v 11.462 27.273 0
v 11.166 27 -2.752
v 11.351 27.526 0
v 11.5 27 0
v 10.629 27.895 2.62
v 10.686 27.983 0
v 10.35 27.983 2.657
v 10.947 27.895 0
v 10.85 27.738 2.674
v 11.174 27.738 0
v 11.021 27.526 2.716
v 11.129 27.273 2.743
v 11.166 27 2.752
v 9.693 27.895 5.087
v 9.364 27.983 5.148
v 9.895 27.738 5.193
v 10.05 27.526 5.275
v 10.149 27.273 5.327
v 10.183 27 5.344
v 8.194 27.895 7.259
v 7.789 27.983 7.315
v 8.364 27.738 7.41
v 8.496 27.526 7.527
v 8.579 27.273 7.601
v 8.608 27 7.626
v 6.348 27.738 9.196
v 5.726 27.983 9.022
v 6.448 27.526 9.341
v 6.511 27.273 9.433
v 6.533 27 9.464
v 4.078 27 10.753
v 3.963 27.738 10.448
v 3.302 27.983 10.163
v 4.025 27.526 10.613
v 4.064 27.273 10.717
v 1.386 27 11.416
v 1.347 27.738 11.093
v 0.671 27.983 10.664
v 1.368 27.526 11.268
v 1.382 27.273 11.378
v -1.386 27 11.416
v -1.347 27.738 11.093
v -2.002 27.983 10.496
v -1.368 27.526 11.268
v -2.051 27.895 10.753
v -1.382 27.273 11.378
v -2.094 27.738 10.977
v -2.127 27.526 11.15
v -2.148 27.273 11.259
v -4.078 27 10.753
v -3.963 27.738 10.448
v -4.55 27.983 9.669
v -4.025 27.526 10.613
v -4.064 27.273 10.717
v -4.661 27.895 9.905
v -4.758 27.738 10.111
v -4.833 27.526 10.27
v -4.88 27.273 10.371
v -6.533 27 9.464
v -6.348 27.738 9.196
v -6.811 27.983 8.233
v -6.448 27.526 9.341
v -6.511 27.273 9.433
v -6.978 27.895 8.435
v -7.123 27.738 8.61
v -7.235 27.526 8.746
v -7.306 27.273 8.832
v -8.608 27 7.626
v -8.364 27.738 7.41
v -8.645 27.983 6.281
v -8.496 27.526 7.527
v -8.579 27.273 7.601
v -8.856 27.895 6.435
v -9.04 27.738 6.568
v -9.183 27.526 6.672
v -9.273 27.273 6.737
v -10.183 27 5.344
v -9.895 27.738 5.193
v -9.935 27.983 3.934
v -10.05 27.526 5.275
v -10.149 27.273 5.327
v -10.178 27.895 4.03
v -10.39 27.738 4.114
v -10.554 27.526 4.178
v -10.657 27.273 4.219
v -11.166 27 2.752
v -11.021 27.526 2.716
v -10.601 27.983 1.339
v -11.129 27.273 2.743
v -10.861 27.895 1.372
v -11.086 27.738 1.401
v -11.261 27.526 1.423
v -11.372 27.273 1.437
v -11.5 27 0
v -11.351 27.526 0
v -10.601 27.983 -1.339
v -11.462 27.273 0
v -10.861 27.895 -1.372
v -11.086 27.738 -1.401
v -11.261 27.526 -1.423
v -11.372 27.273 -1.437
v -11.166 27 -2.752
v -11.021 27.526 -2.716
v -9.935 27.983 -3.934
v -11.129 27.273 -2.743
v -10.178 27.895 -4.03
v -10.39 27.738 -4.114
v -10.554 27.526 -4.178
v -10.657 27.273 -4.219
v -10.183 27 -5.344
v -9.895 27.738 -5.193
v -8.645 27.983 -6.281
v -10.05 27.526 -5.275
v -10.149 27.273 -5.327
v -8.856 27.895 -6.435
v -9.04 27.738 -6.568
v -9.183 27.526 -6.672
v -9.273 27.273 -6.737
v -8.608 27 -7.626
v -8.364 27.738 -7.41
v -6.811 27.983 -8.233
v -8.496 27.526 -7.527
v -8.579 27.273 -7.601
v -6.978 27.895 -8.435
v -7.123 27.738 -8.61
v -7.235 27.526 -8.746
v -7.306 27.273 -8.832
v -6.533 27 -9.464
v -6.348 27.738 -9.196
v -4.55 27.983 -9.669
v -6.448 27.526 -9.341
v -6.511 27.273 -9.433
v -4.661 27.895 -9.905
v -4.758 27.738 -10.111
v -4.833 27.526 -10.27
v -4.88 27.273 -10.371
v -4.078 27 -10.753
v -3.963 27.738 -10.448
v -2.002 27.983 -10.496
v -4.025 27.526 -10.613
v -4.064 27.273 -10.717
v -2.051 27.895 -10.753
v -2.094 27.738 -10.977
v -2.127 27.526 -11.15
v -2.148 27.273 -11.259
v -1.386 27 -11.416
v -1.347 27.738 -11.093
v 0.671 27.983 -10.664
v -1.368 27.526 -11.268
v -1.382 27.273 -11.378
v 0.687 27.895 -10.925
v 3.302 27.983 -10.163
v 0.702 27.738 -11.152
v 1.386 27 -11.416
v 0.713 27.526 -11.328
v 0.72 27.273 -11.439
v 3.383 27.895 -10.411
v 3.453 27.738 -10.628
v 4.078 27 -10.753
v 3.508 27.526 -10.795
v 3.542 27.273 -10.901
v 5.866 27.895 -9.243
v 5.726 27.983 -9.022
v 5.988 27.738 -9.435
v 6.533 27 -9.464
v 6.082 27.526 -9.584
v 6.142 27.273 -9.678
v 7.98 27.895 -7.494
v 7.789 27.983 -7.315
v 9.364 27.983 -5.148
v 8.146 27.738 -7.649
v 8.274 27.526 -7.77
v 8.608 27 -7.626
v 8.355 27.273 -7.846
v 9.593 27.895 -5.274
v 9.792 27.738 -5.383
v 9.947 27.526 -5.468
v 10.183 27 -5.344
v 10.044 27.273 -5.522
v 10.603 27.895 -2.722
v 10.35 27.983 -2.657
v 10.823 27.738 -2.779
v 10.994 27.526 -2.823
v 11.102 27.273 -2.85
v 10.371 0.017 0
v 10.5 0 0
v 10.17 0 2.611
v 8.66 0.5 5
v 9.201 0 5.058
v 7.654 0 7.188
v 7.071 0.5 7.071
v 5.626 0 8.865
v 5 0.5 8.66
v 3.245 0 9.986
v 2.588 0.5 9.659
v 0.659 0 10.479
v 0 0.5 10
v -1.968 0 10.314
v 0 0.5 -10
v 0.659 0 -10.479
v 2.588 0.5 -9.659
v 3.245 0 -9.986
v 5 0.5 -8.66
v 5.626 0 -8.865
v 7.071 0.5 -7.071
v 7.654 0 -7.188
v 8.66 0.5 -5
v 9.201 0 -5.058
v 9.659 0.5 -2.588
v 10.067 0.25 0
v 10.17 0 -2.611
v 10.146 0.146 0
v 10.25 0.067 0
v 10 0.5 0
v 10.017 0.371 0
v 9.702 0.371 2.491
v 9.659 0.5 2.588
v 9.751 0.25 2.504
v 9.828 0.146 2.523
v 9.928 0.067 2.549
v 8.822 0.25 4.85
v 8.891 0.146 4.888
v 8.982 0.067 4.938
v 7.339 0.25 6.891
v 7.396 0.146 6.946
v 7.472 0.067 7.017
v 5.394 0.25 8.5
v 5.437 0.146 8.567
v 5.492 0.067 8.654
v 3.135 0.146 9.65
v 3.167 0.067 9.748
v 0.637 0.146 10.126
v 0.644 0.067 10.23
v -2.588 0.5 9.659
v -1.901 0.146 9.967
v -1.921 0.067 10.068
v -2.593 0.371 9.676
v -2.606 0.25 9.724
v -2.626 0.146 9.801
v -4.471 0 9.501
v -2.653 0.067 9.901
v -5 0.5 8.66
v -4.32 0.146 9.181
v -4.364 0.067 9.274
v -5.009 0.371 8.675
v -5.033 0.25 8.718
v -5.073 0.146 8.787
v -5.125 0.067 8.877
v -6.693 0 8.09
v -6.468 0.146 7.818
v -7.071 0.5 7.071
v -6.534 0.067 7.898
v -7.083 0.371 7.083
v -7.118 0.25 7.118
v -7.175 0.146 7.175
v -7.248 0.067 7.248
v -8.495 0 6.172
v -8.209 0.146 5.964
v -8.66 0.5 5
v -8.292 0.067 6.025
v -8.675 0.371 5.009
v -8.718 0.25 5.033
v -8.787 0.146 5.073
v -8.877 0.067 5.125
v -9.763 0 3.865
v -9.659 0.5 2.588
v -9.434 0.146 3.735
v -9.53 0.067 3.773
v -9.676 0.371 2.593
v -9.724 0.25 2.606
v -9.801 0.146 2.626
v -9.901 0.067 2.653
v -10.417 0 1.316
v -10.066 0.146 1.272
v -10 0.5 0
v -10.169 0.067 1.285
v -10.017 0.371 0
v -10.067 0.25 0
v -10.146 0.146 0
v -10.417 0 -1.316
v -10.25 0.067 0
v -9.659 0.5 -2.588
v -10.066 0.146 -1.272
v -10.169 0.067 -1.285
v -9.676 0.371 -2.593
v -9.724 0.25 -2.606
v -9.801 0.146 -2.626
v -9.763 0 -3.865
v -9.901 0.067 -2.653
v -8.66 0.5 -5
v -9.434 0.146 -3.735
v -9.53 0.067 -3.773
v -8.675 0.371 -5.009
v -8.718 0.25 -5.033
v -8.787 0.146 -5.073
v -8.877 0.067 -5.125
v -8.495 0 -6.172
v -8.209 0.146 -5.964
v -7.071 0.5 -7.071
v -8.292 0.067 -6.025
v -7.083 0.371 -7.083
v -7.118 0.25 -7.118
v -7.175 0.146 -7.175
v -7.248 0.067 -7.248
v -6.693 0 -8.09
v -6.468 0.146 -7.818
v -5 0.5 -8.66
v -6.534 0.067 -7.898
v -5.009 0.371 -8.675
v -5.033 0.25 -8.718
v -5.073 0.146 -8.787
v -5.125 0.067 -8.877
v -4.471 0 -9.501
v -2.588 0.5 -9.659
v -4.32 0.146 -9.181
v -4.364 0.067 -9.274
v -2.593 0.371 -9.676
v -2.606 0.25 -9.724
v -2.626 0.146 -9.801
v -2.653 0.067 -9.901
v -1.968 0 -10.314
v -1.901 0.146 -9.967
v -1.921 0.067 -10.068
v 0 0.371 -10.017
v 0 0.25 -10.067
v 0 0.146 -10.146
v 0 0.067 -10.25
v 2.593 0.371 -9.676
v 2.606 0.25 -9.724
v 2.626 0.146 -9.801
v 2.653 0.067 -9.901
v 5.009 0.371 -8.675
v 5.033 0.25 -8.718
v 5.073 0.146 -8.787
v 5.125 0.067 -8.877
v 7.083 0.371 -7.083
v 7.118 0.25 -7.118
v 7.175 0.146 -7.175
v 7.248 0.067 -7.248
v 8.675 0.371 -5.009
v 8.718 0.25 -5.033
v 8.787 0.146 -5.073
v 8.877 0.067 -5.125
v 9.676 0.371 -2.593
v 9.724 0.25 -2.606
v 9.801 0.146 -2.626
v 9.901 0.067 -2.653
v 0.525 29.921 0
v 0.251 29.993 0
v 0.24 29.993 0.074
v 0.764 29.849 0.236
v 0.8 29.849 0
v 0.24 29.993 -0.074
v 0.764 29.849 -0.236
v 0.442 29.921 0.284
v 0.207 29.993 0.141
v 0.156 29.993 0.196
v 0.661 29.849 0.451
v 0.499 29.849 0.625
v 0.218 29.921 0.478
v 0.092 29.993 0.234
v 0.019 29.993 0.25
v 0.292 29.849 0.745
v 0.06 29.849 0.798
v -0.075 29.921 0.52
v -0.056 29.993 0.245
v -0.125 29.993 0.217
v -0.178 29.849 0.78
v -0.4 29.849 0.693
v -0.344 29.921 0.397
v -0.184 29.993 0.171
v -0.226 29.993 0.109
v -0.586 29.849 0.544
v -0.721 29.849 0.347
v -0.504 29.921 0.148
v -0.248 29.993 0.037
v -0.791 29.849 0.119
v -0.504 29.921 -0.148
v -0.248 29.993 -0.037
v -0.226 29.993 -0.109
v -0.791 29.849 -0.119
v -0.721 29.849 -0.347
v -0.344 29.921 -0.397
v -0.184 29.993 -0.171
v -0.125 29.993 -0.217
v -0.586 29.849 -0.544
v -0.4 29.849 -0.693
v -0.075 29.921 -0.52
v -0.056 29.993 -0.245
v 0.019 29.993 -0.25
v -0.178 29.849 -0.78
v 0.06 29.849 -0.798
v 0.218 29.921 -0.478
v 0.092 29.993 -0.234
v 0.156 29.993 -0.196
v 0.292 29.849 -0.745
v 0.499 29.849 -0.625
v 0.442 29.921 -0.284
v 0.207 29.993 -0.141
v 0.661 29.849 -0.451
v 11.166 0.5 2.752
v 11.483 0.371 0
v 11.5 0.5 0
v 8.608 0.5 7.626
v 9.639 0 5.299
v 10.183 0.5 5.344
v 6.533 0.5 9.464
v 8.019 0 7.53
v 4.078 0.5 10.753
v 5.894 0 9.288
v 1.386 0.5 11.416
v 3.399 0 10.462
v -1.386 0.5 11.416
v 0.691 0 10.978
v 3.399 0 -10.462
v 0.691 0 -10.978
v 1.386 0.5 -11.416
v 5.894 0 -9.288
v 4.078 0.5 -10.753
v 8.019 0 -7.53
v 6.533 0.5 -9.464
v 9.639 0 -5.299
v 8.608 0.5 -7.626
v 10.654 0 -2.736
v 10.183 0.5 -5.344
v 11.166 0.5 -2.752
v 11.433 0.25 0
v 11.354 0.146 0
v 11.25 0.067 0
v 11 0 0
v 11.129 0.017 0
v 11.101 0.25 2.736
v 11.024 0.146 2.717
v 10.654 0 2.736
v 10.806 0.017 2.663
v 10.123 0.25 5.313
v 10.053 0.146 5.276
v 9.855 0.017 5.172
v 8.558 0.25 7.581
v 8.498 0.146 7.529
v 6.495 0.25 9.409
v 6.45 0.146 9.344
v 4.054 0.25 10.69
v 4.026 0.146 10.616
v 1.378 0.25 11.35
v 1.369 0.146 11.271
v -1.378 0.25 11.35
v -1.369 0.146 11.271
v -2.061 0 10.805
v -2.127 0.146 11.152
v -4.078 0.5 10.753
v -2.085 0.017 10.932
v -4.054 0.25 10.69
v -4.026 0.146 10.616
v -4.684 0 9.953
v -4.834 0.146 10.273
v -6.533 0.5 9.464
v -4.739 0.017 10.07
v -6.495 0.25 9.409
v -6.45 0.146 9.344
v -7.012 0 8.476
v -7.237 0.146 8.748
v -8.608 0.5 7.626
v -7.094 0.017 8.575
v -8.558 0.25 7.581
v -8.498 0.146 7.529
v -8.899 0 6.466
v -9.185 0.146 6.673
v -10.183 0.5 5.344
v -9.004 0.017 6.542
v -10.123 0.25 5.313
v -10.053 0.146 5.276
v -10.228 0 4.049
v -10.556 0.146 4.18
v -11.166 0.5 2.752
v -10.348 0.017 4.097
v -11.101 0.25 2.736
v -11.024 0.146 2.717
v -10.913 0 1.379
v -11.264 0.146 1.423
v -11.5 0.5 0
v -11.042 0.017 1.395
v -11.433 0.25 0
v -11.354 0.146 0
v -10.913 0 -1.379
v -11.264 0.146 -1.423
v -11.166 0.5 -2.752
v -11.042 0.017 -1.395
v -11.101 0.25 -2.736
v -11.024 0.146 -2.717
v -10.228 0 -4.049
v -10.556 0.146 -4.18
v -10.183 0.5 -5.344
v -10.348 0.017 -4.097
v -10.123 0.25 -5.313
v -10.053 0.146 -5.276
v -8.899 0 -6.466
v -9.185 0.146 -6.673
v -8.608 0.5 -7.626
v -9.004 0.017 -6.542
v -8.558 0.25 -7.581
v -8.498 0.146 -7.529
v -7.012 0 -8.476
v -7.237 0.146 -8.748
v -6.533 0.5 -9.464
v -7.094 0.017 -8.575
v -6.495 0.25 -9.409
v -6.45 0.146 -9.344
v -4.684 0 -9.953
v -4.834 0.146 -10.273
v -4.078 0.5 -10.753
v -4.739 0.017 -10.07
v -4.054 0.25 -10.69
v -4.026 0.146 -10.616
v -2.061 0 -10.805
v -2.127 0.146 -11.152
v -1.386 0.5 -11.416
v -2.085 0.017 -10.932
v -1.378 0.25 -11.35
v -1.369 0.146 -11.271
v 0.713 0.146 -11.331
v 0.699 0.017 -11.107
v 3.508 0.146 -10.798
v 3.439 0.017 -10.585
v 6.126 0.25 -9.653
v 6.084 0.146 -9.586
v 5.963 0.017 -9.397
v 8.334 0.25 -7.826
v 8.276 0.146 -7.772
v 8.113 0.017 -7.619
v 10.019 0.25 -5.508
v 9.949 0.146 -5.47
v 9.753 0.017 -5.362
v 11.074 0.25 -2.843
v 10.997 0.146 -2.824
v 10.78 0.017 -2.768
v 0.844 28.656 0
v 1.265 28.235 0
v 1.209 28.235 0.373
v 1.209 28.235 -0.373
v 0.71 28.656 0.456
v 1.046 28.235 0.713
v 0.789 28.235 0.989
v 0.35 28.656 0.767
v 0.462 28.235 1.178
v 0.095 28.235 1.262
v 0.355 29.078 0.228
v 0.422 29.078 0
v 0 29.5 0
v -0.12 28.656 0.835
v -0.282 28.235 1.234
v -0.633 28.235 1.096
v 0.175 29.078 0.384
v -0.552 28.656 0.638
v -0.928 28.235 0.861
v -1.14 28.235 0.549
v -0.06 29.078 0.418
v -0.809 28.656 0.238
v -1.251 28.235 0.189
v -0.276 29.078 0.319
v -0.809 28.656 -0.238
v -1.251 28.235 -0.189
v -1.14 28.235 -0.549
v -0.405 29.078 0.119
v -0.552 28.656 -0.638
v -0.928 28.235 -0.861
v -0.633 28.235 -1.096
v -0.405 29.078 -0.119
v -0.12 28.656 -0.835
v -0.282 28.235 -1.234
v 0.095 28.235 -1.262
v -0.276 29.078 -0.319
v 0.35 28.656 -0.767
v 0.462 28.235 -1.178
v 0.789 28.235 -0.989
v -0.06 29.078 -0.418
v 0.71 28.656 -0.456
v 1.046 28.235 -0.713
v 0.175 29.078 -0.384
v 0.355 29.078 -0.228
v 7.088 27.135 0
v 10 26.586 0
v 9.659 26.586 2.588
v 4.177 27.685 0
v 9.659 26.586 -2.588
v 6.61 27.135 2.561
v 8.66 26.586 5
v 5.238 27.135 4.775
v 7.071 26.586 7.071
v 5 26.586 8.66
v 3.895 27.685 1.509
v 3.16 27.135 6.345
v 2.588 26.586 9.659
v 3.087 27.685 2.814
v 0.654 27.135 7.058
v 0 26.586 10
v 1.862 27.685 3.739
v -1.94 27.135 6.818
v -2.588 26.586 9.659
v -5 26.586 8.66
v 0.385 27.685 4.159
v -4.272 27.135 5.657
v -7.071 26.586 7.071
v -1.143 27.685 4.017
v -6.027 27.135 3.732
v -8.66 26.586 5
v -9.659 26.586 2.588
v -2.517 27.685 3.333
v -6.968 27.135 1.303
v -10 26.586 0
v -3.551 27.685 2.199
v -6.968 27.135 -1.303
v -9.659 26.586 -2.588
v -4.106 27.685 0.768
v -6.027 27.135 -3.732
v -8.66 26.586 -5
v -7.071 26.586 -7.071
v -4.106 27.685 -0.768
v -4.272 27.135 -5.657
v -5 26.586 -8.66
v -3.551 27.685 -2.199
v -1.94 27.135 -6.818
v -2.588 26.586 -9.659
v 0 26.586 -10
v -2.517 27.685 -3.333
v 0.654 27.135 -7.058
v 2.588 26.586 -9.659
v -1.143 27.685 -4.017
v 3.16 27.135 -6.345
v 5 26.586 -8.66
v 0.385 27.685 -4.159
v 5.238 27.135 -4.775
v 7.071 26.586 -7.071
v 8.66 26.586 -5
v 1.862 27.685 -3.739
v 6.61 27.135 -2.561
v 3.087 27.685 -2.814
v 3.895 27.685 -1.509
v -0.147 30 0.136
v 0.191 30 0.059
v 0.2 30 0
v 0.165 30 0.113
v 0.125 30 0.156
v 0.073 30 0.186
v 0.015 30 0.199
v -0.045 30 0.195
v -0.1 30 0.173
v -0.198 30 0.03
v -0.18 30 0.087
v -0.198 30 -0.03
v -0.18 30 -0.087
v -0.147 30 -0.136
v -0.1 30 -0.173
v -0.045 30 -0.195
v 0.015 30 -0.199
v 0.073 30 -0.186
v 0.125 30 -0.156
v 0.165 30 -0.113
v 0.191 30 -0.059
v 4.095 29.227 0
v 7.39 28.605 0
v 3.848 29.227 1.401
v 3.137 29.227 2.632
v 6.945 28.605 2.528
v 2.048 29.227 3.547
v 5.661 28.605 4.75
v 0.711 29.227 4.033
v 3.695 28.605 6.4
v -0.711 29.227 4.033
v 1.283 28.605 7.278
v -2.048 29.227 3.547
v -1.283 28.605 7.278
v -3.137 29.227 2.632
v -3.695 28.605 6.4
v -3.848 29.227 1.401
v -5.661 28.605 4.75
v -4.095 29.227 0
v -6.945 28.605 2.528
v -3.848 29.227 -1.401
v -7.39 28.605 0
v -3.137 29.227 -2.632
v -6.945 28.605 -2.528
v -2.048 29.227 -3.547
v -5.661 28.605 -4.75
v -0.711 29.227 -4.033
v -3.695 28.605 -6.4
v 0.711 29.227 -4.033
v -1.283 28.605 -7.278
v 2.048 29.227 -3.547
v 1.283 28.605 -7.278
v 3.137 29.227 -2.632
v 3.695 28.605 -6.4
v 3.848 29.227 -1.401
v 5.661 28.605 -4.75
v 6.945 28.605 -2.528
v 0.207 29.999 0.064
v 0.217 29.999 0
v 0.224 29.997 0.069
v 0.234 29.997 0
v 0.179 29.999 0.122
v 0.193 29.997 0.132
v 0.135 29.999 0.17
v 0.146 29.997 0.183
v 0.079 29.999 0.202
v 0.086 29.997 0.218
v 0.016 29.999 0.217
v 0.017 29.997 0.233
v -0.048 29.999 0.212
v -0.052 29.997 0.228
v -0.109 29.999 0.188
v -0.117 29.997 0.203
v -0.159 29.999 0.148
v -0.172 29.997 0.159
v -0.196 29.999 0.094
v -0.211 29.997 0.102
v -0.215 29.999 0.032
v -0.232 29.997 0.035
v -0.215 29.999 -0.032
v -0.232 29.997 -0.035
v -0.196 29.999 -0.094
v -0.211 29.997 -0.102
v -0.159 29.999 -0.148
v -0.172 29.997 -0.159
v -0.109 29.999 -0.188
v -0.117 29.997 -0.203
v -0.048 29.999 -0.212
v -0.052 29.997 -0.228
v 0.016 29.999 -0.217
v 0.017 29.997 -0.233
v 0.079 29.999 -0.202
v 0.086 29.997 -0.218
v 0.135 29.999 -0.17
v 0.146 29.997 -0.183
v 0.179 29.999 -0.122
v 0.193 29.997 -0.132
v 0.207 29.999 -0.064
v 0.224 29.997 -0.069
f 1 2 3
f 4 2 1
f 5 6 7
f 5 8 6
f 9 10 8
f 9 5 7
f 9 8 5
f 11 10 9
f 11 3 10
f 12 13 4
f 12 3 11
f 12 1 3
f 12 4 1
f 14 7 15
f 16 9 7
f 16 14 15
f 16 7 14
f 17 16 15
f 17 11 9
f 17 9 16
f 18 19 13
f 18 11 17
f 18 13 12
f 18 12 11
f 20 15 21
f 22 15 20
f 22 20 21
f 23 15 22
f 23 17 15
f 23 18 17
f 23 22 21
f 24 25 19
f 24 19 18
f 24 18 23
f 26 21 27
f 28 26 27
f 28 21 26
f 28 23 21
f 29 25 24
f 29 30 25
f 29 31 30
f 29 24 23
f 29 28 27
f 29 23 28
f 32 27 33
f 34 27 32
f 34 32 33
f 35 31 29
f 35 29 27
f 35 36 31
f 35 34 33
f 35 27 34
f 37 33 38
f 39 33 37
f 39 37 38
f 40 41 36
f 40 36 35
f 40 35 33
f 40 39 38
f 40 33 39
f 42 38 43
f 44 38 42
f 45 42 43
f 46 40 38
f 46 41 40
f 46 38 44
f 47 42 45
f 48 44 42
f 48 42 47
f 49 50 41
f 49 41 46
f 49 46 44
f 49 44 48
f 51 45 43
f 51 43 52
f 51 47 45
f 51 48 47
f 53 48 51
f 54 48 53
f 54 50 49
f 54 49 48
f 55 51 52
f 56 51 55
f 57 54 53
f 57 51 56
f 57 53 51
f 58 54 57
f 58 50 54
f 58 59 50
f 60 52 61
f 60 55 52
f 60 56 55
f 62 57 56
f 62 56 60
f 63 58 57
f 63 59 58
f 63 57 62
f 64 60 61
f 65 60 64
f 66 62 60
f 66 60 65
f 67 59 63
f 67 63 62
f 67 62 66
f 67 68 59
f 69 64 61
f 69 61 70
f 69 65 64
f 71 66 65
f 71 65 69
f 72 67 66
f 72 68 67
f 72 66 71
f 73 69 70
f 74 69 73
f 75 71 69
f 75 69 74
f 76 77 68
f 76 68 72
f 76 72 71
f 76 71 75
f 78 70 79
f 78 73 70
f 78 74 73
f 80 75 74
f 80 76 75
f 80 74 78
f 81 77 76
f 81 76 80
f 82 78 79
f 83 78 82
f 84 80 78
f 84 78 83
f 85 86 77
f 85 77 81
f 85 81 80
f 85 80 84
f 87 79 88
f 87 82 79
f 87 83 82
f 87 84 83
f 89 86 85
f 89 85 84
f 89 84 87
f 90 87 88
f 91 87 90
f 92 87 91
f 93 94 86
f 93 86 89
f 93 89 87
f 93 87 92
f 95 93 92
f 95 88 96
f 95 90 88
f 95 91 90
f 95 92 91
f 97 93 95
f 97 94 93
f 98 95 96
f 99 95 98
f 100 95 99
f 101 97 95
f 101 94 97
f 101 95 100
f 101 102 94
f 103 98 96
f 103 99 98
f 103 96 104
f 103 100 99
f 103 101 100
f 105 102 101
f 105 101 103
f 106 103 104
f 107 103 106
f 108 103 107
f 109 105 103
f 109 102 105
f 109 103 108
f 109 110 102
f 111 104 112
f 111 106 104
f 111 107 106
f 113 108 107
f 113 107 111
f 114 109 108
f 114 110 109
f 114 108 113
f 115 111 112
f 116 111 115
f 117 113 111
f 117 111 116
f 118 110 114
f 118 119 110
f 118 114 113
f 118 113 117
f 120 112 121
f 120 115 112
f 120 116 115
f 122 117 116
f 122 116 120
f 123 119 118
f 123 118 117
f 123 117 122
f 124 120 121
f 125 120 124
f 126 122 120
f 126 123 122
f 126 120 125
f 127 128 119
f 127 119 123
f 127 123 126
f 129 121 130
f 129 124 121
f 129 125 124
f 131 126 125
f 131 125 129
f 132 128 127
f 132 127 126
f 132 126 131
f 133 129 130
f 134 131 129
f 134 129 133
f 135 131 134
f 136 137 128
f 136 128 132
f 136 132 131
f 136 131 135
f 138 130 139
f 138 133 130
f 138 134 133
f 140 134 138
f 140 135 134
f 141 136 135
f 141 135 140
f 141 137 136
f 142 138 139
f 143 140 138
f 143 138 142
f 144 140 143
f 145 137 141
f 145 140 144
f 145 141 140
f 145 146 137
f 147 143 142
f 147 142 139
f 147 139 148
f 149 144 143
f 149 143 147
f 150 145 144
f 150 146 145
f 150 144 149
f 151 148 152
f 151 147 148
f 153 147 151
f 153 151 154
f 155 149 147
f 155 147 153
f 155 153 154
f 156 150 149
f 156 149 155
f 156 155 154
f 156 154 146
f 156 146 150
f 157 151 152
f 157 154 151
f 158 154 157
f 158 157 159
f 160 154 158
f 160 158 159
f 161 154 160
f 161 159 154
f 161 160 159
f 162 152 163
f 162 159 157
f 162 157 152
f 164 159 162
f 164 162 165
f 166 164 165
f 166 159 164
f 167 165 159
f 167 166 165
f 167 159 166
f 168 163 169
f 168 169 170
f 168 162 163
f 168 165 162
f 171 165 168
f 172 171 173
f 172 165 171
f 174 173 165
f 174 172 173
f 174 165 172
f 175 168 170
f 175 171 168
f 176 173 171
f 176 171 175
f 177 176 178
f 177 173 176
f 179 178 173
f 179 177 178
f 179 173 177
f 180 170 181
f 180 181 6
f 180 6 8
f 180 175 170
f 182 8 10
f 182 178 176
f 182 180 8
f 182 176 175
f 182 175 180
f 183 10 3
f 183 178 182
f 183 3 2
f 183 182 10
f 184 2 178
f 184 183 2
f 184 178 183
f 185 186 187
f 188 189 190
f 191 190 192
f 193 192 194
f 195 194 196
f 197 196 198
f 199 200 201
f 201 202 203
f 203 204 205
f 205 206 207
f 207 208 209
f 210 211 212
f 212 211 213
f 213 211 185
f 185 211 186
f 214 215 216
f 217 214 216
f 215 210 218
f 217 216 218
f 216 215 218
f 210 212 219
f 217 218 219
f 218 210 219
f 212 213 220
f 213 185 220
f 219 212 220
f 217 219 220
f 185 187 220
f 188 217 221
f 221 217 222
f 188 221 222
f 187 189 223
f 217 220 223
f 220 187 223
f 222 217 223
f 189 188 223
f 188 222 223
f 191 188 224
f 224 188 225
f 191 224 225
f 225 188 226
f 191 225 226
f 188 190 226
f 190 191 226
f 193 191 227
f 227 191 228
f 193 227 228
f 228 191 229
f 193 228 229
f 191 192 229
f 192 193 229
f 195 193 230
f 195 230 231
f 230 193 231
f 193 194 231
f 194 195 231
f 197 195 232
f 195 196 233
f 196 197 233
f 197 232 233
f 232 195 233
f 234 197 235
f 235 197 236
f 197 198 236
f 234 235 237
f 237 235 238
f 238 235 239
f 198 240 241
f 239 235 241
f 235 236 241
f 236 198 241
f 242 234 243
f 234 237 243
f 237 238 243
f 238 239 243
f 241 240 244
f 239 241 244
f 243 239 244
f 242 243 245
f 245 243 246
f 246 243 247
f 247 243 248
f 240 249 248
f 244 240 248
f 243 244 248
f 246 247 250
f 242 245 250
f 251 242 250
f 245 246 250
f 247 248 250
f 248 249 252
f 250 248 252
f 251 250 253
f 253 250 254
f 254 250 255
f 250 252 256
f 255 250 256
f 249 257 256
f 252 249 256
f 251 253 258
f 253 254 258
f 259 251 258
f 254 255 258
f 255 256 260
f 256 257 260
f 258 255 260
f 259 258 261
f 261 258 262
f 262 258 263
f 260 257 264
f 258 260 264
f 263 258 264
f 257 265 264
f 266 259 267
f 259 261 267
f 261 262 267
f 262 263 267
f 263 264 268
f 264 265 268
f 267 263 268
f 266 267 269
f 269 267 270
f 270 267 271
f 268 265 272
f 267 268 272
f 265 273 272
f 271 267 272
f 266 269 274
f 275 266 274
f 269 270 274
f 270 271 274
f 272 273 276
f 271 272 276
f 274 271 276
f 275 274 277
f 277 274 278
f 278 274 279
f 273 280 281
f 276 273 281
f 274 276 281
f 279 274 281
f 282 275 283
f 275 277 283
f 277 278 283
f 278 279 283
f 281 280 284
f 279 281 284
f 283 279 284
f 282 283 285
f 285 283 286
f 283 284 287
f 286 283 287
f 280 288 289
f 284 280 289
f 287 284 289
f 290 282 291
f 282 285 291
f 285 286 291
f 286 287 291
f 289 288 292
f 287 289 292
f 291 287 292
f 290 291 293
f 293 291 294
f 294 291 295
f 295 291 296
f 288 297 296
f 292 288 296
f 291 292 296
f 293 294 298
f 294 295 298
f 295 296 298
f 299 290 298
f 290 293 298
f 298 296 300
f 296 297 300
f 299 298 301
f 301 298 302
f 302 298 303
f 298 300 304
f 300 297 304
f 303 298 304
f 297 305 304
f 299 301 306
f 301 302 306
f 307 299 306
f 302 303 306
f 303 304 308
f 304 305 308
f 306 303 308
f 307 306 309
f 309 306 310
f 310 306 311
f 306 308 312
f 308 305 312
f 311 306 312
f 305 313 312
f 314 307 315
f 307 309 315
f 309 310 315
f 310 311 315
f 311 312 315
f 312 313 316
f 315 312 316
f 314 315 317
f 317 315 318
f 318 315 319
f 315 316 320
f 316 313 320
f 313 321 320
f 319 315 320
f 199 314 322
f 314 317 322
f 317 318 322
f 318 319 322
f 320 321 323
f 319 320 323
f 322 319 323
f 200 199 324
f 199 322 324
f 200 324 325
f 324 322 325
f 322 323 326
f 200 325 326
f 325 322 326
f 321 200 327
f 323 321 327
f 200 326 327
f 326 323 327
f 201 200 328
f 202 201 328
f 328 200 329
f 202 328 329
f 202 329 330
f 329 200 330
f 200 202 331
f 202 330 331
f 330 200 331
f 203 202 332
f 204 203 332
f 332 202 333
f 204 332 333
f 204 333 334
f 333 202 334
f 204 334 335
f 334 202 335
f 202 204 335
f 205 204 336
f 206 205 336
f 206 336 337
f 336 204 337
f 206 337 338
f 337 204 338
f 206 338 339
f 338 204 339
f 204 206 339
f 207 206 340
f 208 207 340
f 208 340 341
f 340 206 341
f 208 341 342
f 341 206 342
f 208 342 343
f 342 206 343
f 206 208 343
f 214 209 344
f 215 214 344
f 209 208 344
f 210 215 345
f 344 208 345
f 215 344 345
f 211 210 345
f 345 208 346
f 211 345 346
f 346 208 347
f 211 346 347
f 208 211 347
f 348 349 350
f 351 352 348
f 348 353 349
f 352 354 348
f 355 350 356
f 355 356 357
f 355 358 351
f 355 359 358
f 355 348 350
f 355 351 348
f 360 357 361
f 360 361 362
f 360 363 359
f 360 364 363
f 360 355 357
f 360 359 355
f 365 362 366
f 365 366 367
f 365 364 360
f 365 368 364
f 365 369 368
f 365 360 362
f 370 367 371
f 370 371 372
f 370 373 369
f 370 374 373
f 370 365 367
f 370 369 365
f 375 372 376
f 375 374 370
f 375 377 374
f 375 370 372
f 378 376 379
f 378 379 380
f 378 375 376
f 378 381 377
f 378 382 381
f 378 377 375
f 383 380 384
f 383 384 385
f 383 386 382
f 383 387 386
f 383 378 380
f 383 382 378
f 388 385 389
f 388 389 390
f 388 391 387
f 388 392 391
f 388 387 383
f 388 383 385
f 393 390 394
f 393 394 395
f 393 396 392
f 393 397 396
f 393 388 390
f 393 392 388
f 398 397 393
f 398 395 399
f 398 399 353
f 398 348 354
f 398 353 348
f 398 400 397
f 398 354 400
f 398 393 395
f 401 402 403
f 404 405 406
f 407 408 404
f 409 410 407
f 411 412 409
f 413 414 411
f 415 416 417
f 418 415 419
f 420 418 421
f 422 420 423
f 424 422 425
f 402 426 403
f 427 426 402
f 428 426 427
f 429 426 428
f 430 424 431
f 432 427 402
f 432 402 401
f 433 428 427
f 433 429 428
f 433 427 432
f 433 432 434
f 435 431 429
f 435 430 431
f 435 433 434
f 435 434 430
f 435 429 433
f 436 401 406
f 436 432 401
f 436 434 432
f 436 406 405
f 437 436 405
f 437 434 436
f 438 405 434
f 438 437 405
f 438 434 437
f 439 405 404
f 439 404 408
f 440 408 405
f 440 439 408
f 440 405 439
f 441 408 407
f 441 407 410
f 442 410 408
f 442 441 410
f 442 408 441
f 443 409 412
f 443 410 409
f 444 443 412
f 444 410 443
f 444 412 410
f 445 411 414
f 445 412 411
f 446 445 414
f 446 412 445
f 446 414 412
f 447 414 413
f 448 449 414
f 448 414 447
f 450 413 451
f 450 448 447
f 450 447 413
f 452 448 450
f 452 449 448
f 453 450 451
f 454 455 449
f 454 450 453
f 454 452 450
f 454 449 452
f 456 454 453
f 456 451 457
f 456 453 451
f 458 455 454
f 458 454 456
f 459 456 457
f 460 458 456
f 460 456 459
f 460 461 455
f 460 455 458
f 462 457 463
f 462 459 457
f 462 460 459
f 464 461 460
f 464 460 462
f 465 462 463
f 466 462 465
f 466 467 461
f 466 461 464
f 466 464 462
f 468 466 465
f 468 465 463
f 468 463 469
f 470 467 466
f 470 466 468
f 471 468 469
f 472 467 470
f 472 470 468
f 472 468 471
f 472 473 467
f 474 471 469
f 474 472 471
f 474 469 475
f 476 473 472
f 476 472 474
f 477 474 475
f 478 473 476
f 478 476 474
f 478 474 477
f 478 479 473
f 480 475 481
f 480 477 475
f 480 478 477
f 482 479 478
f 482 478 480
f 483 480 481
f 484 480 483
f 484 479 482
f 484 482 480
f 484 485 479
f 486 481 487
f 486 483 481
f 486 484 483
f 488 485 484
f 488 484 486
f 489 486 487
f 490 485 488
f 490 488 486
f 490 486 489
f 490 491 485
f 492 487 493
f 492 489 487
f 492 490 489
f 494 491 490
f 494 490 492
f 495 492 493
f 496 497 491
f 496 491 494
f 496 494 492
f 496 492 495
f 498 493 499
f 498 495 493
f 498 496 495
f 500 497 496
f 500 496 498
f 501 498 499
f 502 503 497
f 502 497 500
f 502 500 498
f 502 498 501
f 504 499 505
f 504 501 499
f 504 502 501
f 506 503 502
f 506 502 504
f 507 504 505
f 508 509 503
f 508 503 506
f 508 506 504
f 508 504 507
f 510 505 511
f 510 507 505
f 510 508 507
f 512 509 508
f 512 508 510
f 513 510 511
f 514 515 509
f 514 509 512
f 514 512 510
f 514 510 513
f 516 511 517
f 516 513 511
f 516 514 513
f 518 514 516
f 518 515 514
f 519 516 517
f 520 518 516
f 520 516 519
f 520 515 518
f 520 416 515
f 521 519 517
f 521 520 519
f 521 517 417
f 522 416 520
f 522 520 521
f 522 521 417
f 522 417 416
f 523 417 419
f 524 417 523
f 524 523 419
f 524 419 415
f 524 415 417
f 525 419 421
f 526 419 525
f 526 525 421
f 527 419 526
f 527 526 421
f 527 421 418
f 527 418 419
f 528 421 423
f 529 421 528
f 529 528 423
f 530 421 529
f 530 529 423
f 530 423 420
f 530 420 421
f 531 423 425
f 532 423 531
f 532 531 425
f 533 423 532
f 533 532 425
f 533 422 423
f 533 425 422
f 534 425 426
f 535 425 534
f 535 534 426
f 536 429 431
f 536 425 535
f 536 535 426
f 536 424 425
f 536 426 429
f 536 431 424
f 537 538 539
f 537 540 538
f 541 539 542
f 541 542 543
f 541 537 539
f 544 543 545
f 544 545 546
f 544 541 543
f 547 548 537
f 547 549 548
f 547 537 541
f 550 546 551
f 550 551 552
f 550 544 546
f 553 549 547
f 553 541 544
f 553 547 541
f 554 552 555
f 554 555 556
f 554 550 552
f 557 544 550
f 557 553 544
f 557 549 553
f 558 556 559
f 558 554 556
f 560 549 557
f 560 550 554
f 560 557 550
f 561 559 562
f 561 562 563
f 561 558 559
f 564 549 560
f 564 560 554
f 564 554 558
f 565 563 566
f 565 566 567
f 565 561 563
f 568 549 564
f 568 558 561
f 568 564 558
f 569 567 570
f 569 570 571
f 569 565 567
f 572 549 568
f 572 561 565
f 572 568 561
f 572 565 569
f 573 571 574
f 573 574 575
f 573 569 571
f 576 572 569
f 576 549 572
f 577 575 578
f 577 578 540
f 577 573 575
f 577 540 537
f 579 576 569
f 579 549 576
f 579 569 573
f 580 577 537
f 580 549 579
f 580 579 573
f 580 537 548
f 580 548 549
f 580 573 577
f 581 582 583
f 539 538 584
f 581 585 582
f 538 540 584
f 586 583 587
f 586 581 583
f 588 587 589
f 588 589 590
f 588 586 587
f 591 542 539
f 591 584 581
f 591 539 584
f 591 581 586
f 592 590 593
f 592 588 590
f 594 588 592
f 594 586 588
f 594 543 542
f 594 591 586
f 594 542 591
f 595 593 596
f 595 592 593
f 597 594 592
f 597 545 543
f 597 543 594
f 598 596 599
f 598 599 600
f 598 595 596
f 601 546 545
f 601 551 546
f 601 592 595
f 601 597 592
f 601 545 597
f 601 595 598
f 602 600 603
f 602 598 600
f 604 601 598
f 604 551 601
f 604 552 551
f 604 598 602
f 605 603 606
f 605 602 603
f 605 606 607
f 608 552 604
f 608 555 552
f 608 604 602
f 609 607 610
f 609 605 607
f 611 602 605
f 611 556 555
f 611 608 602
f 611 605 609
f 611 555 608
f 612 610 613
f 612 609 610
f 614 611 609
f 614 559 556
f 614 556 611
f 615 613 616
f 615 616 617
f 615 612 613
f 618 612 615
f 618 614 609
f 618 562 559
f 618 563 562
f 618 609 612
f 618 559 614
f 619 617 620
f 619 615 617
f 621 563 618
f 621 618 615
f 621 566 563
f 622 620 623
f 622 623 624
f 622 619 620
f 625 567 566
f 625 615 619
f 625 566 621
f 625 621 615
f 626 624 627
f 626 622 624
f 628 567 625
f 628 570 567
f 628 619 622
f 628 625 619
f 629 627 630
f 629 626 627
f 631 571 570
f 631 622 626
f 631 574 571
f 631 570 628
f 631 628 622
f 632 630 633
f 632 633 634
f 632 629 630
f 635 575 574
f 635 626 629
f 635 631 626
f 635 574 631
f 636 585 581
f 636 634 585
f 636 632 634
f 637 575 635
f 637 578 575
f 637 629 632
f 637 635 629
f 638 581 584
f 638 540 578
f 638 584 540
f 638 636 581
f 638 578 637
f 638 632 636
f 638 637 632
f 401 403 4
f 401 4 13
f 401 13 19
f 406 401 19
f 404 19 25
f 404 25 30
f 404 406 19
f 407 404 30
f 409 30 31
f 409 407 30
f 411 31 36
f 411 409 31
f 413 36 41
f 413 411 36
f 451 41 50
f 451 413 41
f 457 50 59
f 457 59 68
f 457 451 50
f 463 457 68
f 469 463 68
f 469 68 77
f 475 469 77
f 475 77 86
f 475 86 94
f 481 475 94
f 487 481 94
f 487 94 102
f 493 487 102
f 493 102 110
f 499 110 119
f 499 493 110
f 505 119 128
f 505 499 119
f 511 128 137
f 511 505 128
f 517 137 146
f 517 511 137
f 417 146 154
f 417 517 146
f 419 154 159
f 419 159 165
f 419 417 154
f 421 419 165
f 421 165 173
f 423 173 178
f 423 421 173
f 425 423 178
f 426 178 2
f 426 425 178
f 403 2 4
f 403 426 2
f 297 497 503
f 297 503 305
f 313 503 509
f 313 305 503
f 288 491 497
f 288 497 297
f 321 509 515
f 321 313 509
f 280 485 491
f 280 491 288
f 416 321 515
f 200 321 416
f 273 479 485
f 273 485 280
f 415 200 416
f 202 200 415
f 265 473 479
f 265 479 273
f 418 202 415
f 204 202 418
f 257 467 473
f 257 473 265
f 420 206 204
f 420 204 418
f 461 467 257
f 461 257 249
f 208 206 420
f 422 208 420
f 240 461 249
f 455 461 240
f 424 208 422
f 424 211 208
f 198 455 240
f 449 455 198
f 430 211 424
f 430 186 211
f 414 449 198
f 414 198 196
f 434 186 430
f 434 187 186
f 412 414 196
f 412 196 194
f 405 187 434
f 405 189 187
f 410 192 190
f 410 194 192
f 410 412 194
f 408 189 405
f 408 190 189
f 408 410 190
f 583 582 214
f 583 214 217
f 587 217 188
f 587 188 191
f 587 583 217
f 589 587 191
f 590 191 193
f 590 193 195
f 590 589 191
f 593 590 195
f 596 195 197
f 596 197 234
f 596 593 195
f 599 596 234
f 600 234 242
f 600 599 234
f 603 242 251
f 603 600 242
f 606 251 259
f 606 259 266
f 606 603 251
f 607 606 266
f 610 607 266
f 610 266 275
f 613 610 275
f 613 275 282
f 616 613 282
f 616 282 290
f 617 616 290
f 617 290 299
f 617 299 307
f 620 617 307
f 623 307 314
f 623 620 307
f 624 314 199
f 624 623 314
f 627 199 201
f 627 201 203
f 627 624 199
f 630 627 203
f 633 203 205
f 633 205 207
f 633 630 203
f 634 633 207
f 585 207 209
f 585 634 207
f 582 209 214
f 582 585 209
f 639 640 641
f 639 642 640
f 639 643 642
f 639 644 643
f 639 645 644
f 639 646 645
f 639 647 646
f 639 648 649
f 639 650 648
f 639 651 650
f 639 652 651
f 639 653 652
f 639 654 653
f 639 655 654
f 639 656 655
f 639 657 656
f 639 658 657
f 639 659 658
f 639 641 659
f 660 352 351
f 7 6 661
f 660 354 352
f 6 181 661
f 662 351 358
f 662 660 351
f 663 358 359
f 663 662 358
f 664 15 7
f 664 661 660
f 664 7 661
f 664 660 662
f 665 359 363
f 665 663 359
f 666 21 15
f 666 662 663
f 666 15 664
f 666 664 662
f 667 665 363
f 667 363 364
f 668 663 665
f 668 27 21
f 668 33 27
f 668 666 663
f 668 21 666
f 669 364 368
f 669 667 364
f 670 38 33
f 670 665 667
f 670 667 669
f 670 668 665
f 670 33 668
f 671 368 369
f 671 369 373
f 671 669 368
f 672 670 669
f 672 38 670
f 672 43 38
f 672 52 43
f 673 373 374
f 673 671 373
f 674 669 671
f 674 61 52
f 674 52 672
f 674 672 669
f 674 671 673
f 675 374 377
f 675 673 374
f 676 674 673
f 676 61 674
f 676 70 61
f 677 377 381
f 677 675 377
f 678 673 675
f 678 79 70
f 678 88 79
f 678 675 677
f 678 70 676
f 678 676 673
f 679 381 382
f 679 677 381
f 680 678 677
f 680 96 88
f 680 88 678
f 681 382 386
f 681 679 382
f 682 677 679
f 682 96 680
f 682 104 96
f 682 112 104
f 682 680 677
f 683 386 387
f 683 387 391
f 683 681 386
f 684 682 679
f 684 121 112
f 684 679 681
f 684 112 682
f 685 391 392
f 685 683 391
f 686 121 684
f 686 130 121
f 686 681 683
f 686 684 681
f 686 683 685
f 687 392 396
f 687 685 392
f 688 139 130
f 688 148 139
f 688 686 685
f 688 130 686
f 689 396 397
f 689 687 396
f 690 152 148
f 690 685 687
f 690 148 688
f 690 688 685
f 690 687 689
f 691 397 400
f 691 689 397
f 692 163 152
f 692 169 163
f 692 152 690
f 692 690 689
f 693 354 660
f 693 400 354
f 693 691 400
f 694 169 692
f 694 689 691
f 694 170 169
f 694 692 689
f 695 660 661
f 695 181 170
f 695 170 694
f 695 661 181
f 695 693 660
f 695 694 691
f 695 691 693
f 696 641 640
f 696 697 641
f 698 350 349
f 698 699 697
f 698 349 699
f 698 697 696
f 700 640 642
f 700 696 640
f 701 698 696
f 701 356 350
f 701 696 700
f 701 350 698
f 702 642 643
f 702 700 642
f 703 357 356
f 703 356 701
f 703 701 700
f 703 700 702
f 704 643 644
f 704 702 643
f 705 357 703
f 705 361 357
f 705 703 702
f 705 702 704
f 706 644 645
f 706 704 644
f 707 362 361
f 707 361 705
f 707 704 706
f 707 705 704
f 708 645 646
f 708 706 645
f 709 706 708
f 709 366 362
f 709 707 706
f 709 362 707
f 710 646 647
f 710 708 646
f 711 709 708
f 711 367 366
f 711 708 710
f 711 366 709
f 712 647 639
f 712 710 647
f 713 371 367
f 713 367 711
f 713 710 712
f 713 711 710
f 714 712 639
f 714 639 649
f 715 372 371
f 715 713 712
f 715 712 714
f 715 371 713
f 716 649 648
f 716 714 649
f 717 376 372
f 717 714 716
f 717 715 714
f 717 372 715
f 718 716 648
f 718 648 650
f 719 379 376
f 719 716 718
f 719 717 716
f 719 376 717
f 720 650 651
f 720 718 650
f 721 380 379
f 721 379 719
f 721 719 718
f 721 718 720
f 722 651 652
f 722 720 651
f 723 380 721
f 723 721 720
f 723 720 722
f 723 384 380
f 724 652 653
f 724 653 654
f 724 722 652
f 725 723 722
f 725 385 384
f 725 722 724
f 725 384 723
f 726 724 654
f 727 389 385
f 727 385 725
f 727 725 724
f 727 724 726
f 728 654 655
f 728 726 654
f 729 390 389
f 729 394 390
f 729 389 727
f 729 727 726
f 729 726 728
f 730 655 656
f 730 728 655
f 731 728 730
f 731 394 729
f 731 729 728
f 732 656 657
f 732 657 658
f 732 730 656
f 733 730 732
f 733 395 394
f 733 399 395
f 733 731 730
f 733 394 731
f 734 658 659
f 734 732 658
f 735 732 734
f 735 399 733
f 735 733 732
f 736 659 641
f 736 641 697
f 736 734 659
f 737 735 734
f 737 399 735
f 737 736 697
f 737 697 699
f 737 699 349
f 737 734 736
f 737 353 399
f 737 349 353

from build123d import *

# Parameters (mm, degrees)
FILLET1_R = 0.5


with BuildPart() as part:
    # Sketch1 → Revolve1 (revolve)
    with BuildSketch(Plane.XY):
        with BuildLine():
            Line((10, 0), (10, 26.585564127))
            Line((10, 26.585564127), (1.265397394, 28.234602606))
            Line((1.265397394, 28.234602606), (0, 29.5))
            Line((0, 29.5), (0, 30))
            Line((0, 30), (0.2, 30))
            ThreePointArc((0.2, 30), (0.225652916, 29.998347997), (0.250882045, 29.993419279))
            Line((0.250882045, 29.993419279), (0.8, 29.848964991))
            Line((0.8, 29.848964991), (10.685516518, 27.982641146))
            ThreePointArc((10.685516518, 27.982641146), (11.269907955, 27.638154951), (11.5, 27))
            Line((11.5, 27), (11.5, 0))
            Line((11.5, 0), (10, 0))
        make_face()
    revolve(axis=Axis((0, 9.5, 0), (0, -1, 0)))

    # Fillet1
    fillet1_edges = [part.edges().sort_by_distance(p)[0] for p in [
        (-0.8, 29.848964991, 0),
        (-11.5, 0, 0),
        (-10, 0, 0),
    ]]
    fillet(fillet1_edges, radius=FILLET1_R)


solid = part.part
